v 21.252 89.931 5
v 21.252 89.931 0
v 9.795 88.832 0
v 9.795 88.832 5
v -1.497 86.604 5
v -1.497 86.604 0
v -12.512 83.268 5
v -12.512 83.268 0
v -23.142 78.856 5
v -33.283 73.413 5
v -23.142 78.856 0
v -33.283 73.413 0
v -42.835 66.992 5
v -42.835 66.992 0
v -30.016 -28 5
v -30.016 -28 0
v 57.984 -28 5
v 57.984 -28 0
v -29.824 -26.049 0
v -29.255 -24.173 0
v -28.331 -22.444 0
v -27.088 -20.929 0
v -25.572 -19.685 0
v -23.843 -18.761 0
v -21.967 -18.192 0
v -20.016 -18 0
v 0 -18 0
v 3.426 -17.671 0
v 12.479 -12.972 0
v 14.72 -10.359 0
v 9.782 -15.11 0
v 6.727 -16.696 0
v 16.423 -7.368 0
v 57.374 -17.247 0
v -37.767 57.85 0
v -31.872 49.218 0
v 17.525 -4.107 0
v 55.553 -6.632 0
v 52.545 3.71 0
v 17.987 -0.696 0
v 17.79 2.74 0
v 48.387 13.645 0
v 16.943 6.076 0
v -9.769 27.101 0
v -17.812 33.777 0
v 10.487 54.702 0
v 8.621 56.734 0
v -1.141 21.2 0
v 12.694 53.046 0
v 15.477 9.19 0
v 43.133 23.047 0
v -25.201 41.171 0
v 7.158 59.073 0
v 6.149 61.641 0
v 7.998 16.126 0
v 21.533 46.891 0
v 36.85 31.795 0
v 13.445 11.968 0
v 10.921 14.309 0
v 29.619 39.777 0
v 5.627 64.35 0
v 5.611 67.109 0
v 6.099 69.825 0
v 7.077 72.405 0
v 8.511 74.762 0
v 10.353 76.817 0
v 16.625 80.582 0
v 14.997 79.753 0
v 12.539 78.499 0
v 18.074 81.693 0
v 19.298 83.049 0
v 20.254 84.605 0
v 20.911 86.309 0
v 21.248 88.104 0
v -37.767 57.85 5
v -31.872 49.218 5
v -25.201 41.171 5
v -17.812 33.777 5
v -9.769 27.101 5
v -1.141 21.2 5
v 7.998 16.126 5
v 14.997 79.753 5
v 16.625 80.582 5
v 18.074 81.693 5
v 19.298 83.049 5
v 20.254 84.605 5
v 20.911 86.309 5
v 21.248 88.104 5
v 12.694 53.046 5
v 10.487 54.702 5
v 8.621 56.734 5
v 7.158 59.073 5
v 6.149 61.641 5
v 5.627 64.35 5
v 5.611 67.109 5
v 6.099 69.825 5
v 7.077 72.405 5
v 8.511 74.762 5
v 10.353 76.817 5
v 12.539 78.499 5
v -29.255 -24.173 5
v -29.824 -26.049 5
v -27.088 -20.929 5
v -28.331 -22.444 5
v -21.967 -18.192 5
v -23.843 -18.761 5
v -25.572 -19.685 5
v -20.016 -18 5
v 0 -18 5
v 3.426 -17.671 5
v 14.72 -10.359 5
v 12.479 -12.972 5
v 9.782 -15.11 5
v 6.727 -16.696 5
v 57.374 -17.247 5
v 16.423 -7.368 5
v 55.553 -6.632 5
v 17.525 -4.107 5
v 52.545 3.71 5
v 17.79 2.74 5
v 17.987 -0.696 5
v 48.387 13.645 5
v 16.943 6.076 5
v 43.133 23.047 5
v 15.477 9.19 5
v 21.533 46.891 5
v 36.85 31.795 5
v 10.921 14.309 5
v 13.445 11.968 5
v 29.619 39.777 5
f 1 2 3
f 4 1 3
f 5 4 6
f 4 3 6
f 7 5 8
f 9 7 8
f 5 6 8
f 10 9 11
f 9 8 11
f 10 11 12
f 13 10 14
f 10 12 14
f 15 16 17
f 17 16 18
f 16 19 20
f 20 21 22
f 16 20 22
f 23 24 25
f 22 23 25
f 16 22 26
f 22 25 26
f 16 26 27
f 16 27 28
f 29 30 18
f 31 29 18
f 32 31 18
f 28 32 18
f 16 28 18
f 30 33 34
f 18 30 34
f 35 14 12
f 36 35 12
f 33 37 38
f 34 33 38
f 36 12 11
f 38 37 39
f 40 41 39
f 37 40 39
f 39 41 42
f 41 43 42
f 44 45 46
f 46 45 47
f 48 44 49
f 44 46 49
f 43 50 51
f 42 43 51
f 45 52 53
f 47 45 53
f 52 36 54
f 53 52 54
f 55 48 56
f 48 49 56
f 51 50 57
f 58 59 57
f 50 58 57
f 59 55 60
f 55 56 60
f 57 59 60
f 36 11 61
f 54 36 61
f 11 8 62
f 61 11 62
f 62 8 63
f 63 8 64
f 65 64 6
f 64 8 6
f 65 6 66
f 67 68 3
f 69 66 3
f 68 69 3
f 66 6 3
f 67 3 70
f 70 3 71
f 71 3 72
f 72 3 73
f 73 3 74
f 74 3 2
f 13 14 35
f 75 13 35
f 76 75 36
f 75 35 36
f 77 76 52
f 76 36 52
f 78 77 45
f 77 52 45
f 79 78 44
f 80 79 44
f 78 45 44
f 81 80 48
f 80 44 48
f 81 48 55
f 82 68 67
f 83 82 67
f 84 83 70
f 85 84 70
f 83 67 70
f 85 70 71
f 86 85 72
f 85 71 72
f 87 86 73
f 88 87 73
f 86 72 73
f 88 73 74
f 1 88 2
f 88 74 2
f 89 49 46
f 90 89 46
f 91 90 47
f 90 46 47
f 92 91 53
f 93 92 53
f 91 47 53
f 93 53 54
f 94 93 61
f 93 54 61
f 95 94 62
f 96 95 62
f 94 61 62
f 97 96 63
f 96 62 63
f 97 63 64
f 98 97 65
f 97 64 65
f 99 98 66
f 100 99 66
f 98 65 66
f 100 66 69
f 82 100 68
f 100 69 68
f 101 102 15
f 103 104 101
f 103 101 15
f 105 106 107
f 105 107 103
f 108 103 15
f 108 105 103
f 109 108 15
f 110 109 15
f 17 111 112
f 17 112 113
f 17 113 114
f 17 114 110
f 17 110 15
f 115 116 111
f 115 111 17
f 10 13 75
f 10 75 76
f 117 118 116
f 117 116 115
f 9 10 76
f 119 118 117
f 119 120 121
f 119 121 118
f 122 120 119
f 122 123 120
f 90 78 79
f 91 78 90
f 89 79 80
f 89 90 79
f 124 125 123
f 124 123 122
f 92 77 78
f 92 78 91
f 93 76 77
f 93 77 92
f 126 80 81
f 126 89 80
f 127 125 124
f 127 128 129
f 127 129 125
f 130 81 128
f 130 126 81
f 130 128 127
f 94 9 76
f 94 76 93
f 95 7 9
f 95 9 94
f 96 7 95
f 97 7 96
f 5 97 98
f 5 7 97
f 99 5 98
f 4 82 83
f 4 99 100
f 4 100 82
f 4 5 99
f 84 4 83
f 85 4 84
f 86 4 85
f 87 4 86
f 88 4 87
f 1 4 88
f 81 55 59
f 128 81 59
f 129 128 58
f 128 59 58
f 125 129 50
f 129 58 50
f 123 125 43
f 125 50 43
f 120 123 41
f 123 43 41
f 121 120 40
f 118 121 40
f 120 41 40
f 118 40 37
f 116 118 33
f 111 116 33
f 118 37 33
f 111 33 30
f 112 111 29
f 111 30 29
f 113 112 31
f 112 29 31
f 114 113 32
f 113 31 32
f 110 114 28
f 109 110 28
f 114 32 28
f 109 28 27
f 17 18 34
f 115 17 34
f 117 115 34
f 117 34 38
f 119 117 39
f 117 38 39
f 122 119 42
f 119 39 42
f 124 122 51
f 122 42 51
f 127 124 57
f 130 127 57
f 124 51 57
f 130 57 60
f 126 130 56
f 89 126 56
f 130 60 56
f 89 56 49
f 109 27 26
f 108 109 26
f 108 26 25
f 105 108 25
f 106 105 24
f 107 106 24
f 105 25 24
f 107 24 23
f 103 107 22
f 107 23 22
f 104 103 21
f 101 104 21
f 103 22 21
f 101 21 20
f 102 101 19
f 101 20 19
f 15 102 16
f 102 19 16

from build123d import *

# Parameters (mm, degrees)
BOSS_EXTRUDE1_DEPTH = 5


with BuildPart() as part:
    # Sketch1 → Boss-Extrude1 (new body)
    with BuildSketch(Plane.XY):
        with BuildLine():
            ThreePointArc((14.997095472, 79.753001356), (19.811312597, 83.805122165), (21.252071738, 89.930526859))
            ThreePointArc((21.252071738, 89.930526859), (-12.511912674, 83.267872862), (-42.835125453, 66.992112713))
            ThreePointArc((-42.835125453, 66.992112713), (-21.592512505, 37.387836987), (7.997709308, 16.125651795))
            ThreePointArc((7.997709308, 16.125651795), (17.525149533, -4.107205113), (0, -18))
            Line((0, -18), (-20.016448778, -18))
            ThreePointArc((-20.016448778, -18), (-27.087516589, -20.928932188), (-30.016448778, -28))
            Line((-30.016448778, -28), (57.983551222, -28))
            ThreePointArc((57.983551222, -28), (45.893125435, 18.420717493), (12.694098189, 53.045650682))
            ThreePointArc((12.694098189, 53.045650682), (5.610650395, 67.109432367), (14.997095472, 79.753001356))
        make_face()
    extrude(amount=BOSS_EXTRUDE1_DEPTH)


solid = part.part
